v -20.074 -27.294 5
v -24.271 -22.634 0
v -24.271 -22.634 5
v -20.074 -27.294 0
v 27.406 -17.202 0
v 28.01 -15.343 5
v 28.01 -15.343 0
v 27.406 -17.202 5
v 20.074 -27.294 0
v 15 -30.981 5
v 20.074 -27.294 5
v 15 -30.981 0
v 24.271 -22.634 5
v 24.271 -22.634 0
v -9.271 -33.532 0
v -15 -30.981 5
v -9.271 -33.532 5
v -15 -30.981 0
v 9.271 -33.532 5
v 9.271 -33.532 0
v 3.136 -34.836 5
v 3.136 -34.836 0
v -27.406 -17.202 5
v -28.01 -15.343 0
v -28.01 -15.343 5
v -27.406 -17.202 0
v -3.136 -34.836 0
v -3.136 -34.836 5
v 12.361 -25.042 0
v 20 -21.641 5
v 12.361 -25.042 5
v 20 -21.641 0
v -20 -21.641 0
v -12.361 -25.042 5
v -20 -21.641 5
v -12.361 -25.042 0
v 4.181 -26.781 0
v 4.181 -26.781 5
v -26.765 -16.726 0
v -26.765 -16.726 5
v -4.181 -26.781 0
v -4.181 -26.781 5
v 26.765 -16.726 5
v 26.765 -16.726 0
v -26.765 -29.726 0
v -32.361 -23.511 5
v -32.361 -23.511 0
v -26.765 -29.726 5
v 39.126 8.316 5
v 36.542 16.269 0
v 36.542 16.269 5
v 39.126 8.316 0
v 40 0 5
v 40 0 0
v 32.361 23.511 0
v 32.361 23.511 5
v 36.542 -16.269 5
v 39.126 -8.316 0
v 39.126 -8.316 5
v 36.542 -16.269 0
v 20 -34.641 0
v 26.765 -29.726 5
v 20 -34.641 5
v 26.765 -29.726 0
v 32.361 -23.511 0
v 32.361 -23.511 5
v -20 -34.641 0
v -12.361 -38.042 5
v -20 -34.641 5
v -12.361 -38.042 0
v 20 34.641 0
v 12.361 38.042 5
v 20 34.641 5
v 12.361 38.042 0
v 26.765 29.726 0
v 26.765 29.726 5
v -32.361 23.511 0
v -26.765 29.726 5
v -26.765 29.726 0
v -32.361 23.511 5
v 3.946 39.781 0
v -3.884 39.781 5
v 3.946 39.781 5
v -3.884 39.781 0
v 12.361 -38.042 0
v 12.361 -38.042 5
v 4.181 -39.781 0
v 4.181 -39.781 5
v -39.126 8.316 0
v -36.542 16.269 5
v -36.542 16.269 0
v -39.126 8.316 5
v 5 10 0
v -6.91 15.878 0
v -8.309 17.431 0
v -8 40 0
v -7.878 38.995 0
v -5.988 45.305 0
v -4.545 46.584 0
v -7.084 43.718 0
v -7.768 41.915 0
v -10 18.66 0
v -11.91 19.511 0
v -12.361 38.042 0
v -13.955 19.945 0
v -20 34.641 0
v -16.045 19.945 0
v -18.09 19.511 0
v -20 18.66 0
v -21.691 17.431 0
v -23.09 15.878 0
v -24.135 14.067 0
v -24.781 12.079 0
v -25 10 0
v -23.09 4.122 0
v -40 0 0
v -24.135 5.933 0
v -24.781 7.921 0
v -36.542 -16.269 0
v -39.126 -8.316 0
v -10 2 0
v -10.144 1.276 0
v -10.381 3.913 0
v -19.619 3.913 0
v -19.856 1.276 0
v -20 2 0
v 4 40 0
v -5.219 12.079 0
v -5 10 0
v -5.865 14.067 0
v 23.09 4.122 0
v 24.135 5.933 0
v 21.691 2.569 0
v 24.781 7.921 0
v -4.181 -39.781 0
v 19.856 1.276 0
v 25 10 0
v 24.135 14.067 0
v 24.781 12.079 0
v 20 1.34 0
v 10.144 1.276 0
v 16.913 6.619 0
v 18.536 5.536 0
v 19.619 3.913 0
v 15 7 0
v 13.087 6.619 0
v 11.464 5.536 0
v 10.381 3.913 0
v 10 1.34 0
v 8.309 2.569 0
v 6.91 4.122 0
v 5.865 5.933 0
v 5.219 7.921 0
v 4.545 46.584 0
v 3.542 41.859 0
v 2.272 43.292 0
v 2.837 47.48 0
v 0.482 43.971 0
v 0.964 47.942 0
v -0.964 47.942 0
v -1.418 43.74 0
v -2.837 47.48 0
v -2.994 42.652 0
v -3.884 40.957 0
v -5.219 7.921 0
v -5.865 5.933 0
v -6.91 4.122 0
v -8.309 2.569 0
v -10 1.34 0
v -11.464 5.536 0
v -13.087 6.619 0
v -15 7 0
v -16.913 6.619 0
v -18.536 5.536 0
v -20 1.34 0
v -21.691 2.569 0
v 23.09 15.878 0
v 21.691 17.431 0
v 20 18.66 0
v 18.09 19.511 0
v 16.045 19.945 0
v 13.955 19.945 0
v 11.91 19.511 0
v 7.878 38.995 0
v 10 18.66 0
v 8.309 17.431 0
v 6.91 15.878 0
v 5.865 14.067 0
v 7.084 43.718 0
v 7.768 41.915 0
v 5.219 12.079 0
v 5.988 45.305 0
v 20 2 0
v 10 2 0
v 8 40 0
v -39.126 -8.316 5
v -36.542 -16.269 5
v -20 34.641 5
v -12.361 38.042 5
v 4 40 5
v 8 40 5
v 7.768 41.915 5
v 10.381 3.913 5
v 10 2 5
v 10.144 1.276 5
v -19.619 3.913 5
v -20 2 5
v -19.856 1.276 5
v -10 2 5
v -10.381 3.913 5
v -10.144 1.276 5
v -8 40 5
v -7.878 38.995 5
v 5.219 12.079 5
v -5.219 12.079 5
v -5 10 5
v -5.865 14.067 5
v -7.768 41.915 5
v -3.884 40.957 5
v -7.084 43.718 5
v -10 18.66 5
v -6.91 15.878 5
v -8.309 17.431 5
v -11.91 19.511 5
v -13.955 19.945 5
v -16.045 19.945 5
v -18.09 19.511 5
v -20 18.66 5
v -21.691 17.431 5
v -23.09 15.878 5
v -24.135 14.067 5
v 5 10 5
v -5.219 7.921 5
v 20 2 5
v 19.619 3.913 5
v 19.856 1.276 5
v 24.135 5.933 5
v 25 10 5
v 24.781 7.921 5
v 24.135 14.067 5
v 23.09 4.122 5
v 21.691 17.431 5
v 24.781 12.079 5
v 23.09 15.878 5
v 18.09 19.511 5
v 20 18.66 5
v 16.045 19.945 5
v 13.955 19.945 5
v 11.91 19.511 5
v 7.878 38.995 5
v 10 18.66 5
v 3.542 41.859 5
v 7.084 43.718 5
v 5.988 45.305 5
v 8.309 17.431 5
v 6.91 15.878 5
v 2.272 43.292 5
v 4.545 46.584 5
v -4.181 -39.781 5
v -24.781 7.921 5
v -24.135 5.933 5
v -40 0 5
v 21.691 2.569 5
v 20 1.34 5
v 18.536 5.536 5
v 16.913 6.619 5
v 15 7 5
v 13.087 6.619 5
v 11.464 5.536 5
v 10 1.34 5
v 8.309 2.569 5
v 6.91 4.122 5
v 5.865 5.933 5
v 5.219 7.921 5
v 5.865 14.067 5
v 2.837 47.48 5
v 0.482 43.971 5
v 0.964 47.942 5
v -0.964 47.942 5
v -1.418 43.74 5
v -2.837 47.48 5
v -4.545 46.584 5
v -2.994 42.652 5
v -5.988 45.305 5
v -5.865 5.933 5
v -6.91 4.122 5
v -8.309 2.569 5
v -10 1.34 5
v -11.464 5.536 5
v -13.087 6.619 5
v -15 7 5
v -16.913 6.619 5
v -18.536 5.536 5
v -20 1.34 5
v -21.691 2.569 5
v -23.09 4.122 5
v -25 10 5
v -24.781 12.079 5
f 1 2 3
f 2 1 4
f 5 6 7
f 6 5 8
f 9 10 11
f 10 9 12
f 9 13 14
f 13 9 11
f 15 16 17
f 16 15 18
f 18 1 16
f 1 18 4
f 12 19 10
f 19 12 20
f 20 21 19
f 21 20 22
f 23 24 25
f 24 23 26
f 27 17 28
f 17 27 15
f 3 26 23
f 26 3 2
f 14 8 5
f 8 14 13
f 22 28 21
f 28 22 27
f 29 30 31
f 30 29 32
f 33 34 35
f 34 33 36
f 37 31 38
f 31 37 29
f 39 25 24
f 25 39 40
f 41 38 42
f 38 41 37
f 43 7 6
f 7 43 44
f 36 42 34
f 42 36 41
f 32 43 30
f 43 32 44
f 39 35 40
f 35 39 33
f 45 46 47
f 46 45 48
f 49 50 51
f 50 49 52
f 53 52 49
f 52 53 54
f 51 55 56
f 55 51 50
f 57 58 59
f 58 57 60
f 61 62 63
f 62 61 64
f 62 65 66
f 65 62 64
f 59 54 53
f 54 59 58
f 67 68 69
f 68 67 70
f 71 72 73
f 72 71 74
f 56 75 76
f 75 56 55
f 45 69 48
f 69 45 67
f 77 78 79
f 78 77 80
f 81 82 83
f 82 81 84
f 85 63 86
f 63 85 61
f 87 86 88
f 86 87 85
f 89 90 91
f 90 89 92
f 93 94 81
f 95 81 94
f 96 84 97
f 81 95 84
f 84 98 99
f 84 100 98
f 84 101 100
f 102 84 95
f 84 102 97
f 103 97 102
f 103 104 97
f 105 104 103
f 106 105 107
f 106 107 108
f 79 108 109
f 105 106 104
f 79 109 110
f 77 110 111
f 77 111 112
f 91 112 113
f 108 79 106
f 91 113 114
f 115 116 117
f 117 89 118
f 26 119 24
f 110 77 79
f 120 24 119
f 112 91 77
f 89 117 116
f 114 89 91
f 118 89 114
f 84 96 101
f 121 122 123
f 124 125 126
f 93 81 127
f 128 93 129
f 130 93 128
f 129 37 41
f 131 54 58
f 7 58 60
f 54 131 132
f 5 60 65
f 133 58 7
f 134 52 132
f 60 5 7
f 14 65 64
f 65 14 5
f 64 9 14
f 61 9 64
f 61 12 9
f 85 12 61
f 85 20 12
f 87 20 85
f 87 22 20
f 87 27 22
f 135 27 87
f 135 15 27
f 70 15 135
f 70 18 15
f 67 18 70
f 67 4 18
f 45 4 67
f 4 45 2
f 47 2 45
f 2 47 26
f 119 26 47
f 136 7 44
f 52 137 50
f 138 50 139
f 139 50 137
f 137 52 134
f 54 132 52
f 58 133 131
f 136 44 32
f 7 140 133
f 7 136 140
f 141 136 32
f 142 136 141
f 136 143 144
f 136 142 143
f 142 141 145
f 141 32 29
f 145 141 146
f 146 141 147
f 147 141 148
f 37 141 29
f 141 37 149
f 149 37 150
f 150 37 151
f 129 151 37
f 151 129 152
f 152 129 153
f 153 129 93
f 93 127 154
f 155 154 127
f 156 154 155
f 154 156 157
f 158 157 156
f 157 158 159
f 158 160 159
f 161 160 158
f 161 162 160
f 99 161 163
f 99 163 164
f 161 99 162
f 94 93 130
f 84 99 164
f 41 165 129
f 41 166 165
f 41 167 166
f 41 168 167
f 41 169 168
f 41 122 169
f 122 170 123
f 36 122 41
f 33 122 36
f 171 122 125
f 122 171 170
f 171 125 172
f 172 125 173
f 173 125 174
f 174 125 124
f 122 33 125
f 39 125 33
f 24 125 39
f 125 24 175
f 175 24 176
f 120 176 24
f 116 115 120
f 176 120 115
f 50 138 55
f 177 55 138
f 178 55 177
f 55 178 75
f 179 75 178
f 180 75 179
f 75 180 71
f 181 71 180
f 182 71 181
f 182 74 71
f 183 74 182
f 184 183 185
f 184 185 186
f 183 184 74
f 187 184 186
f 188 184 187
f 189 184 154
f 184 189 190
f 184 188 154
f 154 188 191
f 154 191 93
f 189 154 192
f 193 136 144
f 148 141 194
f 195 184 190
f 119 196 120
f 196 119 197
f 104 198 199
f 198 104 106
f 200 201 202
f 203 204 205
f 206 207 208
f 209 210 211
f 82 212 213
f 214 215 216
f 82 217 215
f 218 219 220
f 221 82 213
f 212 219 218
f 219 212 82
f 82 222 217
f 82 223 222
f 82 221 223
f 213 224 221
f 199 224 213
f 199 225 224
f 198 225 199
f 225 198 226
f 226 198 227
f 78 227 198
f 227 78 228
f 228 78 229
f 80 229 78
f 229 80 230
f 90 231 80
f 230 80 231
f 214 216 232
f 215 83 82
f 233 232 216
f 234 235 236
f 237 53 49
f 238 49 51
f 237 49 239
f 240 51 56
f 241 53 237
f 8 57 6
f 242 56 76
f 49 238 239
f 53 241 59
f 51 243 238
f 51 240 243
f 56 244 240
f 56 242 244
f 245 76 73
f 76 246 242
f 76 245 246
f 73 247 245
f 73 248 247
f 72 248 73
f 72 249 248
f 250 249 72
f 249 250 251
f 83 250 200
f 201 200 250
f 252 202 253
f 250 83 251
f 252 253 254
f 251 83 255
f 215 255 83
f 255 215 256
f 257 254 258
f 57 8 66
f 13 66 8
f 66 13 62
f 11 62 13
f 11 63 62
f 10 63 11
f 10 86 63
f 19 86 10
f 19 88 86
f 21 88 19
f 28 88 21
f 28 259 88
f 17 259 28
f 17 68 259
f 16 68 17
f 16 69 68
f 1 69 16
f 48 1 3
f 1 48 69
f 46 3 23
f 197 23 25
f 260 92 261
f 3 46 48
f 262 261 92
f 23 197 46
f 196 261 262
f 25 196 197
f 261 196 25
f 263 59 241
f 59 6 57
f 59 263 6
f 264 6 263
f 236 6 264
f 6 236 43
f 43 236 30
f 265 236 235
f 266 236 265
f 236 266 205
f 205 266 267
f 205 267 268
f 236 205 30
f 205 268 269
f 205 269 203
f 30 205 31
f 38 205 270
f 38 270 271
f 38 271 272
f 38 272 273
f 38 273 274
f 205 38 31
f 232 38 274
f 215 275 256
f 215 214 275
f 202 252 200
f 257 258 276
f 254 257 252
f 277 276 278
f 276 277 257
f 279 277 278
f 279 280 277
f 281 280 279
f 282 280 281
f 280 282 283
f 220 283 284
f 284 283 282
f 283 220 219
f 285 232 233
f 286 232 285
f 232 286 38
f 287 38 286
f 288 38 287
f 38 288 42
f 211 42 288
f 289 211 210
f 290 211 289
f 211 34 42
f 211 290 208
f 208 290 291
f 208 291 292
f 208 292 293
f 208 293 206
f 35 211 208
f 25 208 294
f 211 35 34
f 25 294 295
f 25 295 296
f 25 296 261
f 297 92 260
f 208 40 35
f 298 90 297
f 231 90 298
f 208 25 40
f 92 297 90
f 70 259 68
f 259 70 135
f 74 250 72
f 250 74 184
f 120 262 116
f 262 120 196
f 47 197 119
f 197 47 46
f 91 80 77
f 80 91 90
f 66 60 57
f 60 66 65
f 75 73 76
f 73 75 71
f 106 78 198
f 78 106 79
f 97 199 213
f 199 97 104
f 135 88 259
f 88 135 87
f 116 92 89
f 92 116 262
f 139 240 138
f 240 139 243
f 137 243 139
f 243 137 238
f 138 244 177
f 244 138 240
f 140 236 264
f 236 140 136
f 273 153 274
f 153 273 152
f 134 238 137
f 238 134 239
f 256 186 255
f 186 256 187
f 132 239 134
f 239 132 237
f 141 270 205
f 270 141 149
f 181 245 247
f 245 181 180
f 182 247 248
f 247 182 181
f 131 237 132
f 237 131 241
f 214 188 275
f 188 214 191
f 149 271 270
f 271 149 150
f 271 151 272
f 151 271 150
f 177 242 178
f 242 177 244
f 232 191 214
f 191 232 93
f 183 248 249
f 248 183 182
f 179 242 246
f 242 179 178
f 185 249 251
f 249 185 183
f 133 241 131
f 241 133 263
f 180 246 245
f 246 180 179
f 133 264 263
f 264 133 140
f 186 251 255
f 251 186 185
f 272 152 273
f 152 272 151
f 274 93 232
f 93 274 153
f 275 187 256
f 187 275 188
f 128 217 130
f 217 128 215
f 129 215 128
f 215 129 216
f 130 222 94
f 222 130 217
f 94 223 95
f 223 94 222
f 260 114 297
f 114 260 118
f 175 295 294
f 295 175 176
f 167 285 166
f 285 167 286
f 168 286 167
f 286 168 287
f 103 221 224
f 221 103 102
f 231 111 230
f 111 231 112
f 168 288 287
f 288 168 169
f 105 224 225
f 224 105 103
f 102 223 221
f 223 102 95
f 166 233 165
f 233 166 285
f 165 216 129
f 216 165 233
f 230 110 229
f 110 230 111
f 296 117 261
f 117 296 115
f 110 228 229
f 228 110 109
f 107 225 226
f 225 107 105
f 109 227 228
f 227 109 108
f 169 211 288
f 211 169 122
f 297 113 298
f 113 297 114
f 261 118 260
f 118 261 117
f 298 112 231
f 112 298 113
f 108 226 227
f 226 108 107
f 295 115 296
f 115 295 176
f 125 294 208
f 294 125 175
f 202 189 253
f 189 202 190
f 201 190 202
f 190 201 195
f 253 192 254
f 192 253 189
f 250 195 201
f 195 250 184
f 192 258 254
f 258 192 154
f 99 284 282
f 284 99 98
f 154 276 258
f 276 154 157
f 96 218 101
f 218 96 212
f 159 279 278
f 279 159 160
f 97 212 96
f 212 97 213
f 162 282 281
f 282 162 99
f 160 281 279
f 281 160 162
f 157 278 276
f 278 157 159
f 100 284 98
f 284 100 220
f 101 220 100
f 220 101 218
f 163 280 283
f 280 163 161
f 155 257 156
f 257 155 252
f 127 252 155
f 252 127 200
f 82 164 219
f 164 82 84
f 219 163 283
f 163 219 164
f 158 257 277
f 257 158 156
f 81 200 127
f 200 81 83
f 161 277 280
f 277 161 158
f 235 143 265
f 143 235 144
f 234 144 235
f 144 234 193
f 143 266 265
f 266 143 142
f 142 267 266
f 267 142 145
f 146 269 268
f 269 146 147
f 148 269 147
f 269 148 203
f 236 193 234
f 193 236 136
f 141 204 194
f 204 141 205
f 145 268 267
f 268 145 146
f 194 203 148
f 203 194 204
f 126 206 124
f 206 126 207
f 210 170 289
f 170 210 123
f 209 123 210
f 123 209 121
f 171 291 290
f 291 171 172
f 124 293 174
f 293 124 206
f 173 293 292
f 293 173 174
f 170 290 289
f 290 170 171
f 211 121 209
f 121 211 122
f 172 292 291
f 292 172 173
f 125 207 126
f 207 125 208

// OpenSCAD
// 3D Shapes- Smiley Face

// face
difference() {
    cylinder(h=5, r1=40, r2=40);
    
    translate([15, 10, -1]) cylinder(h=7, r1=10, r2=10);
    translate([-15, 10, -1]) cylinder(h=7, r1=10, r2=10);
    
    // mouth
    difference() {
      translate([0, -5, -1]) cylinder(h=7, r1=30, r2=30);
      translate([0, 13, -2]) cylinder(h=9, r1=40, r2=40);
    }
}

// eyes
translate([15, 2, 0]) cylinder(h=5, r1=5, r2=5);
translate([-15, 2, 0]) cylinder(h=5, r1=5, r2=5);

// loop
translate([0, 40, 0]) difference() {
    cylinder(h=5, r1=8, r2=8);
    translate([0, 0, -1]) cylinder(h=7, r1=4, r2=4);
}
